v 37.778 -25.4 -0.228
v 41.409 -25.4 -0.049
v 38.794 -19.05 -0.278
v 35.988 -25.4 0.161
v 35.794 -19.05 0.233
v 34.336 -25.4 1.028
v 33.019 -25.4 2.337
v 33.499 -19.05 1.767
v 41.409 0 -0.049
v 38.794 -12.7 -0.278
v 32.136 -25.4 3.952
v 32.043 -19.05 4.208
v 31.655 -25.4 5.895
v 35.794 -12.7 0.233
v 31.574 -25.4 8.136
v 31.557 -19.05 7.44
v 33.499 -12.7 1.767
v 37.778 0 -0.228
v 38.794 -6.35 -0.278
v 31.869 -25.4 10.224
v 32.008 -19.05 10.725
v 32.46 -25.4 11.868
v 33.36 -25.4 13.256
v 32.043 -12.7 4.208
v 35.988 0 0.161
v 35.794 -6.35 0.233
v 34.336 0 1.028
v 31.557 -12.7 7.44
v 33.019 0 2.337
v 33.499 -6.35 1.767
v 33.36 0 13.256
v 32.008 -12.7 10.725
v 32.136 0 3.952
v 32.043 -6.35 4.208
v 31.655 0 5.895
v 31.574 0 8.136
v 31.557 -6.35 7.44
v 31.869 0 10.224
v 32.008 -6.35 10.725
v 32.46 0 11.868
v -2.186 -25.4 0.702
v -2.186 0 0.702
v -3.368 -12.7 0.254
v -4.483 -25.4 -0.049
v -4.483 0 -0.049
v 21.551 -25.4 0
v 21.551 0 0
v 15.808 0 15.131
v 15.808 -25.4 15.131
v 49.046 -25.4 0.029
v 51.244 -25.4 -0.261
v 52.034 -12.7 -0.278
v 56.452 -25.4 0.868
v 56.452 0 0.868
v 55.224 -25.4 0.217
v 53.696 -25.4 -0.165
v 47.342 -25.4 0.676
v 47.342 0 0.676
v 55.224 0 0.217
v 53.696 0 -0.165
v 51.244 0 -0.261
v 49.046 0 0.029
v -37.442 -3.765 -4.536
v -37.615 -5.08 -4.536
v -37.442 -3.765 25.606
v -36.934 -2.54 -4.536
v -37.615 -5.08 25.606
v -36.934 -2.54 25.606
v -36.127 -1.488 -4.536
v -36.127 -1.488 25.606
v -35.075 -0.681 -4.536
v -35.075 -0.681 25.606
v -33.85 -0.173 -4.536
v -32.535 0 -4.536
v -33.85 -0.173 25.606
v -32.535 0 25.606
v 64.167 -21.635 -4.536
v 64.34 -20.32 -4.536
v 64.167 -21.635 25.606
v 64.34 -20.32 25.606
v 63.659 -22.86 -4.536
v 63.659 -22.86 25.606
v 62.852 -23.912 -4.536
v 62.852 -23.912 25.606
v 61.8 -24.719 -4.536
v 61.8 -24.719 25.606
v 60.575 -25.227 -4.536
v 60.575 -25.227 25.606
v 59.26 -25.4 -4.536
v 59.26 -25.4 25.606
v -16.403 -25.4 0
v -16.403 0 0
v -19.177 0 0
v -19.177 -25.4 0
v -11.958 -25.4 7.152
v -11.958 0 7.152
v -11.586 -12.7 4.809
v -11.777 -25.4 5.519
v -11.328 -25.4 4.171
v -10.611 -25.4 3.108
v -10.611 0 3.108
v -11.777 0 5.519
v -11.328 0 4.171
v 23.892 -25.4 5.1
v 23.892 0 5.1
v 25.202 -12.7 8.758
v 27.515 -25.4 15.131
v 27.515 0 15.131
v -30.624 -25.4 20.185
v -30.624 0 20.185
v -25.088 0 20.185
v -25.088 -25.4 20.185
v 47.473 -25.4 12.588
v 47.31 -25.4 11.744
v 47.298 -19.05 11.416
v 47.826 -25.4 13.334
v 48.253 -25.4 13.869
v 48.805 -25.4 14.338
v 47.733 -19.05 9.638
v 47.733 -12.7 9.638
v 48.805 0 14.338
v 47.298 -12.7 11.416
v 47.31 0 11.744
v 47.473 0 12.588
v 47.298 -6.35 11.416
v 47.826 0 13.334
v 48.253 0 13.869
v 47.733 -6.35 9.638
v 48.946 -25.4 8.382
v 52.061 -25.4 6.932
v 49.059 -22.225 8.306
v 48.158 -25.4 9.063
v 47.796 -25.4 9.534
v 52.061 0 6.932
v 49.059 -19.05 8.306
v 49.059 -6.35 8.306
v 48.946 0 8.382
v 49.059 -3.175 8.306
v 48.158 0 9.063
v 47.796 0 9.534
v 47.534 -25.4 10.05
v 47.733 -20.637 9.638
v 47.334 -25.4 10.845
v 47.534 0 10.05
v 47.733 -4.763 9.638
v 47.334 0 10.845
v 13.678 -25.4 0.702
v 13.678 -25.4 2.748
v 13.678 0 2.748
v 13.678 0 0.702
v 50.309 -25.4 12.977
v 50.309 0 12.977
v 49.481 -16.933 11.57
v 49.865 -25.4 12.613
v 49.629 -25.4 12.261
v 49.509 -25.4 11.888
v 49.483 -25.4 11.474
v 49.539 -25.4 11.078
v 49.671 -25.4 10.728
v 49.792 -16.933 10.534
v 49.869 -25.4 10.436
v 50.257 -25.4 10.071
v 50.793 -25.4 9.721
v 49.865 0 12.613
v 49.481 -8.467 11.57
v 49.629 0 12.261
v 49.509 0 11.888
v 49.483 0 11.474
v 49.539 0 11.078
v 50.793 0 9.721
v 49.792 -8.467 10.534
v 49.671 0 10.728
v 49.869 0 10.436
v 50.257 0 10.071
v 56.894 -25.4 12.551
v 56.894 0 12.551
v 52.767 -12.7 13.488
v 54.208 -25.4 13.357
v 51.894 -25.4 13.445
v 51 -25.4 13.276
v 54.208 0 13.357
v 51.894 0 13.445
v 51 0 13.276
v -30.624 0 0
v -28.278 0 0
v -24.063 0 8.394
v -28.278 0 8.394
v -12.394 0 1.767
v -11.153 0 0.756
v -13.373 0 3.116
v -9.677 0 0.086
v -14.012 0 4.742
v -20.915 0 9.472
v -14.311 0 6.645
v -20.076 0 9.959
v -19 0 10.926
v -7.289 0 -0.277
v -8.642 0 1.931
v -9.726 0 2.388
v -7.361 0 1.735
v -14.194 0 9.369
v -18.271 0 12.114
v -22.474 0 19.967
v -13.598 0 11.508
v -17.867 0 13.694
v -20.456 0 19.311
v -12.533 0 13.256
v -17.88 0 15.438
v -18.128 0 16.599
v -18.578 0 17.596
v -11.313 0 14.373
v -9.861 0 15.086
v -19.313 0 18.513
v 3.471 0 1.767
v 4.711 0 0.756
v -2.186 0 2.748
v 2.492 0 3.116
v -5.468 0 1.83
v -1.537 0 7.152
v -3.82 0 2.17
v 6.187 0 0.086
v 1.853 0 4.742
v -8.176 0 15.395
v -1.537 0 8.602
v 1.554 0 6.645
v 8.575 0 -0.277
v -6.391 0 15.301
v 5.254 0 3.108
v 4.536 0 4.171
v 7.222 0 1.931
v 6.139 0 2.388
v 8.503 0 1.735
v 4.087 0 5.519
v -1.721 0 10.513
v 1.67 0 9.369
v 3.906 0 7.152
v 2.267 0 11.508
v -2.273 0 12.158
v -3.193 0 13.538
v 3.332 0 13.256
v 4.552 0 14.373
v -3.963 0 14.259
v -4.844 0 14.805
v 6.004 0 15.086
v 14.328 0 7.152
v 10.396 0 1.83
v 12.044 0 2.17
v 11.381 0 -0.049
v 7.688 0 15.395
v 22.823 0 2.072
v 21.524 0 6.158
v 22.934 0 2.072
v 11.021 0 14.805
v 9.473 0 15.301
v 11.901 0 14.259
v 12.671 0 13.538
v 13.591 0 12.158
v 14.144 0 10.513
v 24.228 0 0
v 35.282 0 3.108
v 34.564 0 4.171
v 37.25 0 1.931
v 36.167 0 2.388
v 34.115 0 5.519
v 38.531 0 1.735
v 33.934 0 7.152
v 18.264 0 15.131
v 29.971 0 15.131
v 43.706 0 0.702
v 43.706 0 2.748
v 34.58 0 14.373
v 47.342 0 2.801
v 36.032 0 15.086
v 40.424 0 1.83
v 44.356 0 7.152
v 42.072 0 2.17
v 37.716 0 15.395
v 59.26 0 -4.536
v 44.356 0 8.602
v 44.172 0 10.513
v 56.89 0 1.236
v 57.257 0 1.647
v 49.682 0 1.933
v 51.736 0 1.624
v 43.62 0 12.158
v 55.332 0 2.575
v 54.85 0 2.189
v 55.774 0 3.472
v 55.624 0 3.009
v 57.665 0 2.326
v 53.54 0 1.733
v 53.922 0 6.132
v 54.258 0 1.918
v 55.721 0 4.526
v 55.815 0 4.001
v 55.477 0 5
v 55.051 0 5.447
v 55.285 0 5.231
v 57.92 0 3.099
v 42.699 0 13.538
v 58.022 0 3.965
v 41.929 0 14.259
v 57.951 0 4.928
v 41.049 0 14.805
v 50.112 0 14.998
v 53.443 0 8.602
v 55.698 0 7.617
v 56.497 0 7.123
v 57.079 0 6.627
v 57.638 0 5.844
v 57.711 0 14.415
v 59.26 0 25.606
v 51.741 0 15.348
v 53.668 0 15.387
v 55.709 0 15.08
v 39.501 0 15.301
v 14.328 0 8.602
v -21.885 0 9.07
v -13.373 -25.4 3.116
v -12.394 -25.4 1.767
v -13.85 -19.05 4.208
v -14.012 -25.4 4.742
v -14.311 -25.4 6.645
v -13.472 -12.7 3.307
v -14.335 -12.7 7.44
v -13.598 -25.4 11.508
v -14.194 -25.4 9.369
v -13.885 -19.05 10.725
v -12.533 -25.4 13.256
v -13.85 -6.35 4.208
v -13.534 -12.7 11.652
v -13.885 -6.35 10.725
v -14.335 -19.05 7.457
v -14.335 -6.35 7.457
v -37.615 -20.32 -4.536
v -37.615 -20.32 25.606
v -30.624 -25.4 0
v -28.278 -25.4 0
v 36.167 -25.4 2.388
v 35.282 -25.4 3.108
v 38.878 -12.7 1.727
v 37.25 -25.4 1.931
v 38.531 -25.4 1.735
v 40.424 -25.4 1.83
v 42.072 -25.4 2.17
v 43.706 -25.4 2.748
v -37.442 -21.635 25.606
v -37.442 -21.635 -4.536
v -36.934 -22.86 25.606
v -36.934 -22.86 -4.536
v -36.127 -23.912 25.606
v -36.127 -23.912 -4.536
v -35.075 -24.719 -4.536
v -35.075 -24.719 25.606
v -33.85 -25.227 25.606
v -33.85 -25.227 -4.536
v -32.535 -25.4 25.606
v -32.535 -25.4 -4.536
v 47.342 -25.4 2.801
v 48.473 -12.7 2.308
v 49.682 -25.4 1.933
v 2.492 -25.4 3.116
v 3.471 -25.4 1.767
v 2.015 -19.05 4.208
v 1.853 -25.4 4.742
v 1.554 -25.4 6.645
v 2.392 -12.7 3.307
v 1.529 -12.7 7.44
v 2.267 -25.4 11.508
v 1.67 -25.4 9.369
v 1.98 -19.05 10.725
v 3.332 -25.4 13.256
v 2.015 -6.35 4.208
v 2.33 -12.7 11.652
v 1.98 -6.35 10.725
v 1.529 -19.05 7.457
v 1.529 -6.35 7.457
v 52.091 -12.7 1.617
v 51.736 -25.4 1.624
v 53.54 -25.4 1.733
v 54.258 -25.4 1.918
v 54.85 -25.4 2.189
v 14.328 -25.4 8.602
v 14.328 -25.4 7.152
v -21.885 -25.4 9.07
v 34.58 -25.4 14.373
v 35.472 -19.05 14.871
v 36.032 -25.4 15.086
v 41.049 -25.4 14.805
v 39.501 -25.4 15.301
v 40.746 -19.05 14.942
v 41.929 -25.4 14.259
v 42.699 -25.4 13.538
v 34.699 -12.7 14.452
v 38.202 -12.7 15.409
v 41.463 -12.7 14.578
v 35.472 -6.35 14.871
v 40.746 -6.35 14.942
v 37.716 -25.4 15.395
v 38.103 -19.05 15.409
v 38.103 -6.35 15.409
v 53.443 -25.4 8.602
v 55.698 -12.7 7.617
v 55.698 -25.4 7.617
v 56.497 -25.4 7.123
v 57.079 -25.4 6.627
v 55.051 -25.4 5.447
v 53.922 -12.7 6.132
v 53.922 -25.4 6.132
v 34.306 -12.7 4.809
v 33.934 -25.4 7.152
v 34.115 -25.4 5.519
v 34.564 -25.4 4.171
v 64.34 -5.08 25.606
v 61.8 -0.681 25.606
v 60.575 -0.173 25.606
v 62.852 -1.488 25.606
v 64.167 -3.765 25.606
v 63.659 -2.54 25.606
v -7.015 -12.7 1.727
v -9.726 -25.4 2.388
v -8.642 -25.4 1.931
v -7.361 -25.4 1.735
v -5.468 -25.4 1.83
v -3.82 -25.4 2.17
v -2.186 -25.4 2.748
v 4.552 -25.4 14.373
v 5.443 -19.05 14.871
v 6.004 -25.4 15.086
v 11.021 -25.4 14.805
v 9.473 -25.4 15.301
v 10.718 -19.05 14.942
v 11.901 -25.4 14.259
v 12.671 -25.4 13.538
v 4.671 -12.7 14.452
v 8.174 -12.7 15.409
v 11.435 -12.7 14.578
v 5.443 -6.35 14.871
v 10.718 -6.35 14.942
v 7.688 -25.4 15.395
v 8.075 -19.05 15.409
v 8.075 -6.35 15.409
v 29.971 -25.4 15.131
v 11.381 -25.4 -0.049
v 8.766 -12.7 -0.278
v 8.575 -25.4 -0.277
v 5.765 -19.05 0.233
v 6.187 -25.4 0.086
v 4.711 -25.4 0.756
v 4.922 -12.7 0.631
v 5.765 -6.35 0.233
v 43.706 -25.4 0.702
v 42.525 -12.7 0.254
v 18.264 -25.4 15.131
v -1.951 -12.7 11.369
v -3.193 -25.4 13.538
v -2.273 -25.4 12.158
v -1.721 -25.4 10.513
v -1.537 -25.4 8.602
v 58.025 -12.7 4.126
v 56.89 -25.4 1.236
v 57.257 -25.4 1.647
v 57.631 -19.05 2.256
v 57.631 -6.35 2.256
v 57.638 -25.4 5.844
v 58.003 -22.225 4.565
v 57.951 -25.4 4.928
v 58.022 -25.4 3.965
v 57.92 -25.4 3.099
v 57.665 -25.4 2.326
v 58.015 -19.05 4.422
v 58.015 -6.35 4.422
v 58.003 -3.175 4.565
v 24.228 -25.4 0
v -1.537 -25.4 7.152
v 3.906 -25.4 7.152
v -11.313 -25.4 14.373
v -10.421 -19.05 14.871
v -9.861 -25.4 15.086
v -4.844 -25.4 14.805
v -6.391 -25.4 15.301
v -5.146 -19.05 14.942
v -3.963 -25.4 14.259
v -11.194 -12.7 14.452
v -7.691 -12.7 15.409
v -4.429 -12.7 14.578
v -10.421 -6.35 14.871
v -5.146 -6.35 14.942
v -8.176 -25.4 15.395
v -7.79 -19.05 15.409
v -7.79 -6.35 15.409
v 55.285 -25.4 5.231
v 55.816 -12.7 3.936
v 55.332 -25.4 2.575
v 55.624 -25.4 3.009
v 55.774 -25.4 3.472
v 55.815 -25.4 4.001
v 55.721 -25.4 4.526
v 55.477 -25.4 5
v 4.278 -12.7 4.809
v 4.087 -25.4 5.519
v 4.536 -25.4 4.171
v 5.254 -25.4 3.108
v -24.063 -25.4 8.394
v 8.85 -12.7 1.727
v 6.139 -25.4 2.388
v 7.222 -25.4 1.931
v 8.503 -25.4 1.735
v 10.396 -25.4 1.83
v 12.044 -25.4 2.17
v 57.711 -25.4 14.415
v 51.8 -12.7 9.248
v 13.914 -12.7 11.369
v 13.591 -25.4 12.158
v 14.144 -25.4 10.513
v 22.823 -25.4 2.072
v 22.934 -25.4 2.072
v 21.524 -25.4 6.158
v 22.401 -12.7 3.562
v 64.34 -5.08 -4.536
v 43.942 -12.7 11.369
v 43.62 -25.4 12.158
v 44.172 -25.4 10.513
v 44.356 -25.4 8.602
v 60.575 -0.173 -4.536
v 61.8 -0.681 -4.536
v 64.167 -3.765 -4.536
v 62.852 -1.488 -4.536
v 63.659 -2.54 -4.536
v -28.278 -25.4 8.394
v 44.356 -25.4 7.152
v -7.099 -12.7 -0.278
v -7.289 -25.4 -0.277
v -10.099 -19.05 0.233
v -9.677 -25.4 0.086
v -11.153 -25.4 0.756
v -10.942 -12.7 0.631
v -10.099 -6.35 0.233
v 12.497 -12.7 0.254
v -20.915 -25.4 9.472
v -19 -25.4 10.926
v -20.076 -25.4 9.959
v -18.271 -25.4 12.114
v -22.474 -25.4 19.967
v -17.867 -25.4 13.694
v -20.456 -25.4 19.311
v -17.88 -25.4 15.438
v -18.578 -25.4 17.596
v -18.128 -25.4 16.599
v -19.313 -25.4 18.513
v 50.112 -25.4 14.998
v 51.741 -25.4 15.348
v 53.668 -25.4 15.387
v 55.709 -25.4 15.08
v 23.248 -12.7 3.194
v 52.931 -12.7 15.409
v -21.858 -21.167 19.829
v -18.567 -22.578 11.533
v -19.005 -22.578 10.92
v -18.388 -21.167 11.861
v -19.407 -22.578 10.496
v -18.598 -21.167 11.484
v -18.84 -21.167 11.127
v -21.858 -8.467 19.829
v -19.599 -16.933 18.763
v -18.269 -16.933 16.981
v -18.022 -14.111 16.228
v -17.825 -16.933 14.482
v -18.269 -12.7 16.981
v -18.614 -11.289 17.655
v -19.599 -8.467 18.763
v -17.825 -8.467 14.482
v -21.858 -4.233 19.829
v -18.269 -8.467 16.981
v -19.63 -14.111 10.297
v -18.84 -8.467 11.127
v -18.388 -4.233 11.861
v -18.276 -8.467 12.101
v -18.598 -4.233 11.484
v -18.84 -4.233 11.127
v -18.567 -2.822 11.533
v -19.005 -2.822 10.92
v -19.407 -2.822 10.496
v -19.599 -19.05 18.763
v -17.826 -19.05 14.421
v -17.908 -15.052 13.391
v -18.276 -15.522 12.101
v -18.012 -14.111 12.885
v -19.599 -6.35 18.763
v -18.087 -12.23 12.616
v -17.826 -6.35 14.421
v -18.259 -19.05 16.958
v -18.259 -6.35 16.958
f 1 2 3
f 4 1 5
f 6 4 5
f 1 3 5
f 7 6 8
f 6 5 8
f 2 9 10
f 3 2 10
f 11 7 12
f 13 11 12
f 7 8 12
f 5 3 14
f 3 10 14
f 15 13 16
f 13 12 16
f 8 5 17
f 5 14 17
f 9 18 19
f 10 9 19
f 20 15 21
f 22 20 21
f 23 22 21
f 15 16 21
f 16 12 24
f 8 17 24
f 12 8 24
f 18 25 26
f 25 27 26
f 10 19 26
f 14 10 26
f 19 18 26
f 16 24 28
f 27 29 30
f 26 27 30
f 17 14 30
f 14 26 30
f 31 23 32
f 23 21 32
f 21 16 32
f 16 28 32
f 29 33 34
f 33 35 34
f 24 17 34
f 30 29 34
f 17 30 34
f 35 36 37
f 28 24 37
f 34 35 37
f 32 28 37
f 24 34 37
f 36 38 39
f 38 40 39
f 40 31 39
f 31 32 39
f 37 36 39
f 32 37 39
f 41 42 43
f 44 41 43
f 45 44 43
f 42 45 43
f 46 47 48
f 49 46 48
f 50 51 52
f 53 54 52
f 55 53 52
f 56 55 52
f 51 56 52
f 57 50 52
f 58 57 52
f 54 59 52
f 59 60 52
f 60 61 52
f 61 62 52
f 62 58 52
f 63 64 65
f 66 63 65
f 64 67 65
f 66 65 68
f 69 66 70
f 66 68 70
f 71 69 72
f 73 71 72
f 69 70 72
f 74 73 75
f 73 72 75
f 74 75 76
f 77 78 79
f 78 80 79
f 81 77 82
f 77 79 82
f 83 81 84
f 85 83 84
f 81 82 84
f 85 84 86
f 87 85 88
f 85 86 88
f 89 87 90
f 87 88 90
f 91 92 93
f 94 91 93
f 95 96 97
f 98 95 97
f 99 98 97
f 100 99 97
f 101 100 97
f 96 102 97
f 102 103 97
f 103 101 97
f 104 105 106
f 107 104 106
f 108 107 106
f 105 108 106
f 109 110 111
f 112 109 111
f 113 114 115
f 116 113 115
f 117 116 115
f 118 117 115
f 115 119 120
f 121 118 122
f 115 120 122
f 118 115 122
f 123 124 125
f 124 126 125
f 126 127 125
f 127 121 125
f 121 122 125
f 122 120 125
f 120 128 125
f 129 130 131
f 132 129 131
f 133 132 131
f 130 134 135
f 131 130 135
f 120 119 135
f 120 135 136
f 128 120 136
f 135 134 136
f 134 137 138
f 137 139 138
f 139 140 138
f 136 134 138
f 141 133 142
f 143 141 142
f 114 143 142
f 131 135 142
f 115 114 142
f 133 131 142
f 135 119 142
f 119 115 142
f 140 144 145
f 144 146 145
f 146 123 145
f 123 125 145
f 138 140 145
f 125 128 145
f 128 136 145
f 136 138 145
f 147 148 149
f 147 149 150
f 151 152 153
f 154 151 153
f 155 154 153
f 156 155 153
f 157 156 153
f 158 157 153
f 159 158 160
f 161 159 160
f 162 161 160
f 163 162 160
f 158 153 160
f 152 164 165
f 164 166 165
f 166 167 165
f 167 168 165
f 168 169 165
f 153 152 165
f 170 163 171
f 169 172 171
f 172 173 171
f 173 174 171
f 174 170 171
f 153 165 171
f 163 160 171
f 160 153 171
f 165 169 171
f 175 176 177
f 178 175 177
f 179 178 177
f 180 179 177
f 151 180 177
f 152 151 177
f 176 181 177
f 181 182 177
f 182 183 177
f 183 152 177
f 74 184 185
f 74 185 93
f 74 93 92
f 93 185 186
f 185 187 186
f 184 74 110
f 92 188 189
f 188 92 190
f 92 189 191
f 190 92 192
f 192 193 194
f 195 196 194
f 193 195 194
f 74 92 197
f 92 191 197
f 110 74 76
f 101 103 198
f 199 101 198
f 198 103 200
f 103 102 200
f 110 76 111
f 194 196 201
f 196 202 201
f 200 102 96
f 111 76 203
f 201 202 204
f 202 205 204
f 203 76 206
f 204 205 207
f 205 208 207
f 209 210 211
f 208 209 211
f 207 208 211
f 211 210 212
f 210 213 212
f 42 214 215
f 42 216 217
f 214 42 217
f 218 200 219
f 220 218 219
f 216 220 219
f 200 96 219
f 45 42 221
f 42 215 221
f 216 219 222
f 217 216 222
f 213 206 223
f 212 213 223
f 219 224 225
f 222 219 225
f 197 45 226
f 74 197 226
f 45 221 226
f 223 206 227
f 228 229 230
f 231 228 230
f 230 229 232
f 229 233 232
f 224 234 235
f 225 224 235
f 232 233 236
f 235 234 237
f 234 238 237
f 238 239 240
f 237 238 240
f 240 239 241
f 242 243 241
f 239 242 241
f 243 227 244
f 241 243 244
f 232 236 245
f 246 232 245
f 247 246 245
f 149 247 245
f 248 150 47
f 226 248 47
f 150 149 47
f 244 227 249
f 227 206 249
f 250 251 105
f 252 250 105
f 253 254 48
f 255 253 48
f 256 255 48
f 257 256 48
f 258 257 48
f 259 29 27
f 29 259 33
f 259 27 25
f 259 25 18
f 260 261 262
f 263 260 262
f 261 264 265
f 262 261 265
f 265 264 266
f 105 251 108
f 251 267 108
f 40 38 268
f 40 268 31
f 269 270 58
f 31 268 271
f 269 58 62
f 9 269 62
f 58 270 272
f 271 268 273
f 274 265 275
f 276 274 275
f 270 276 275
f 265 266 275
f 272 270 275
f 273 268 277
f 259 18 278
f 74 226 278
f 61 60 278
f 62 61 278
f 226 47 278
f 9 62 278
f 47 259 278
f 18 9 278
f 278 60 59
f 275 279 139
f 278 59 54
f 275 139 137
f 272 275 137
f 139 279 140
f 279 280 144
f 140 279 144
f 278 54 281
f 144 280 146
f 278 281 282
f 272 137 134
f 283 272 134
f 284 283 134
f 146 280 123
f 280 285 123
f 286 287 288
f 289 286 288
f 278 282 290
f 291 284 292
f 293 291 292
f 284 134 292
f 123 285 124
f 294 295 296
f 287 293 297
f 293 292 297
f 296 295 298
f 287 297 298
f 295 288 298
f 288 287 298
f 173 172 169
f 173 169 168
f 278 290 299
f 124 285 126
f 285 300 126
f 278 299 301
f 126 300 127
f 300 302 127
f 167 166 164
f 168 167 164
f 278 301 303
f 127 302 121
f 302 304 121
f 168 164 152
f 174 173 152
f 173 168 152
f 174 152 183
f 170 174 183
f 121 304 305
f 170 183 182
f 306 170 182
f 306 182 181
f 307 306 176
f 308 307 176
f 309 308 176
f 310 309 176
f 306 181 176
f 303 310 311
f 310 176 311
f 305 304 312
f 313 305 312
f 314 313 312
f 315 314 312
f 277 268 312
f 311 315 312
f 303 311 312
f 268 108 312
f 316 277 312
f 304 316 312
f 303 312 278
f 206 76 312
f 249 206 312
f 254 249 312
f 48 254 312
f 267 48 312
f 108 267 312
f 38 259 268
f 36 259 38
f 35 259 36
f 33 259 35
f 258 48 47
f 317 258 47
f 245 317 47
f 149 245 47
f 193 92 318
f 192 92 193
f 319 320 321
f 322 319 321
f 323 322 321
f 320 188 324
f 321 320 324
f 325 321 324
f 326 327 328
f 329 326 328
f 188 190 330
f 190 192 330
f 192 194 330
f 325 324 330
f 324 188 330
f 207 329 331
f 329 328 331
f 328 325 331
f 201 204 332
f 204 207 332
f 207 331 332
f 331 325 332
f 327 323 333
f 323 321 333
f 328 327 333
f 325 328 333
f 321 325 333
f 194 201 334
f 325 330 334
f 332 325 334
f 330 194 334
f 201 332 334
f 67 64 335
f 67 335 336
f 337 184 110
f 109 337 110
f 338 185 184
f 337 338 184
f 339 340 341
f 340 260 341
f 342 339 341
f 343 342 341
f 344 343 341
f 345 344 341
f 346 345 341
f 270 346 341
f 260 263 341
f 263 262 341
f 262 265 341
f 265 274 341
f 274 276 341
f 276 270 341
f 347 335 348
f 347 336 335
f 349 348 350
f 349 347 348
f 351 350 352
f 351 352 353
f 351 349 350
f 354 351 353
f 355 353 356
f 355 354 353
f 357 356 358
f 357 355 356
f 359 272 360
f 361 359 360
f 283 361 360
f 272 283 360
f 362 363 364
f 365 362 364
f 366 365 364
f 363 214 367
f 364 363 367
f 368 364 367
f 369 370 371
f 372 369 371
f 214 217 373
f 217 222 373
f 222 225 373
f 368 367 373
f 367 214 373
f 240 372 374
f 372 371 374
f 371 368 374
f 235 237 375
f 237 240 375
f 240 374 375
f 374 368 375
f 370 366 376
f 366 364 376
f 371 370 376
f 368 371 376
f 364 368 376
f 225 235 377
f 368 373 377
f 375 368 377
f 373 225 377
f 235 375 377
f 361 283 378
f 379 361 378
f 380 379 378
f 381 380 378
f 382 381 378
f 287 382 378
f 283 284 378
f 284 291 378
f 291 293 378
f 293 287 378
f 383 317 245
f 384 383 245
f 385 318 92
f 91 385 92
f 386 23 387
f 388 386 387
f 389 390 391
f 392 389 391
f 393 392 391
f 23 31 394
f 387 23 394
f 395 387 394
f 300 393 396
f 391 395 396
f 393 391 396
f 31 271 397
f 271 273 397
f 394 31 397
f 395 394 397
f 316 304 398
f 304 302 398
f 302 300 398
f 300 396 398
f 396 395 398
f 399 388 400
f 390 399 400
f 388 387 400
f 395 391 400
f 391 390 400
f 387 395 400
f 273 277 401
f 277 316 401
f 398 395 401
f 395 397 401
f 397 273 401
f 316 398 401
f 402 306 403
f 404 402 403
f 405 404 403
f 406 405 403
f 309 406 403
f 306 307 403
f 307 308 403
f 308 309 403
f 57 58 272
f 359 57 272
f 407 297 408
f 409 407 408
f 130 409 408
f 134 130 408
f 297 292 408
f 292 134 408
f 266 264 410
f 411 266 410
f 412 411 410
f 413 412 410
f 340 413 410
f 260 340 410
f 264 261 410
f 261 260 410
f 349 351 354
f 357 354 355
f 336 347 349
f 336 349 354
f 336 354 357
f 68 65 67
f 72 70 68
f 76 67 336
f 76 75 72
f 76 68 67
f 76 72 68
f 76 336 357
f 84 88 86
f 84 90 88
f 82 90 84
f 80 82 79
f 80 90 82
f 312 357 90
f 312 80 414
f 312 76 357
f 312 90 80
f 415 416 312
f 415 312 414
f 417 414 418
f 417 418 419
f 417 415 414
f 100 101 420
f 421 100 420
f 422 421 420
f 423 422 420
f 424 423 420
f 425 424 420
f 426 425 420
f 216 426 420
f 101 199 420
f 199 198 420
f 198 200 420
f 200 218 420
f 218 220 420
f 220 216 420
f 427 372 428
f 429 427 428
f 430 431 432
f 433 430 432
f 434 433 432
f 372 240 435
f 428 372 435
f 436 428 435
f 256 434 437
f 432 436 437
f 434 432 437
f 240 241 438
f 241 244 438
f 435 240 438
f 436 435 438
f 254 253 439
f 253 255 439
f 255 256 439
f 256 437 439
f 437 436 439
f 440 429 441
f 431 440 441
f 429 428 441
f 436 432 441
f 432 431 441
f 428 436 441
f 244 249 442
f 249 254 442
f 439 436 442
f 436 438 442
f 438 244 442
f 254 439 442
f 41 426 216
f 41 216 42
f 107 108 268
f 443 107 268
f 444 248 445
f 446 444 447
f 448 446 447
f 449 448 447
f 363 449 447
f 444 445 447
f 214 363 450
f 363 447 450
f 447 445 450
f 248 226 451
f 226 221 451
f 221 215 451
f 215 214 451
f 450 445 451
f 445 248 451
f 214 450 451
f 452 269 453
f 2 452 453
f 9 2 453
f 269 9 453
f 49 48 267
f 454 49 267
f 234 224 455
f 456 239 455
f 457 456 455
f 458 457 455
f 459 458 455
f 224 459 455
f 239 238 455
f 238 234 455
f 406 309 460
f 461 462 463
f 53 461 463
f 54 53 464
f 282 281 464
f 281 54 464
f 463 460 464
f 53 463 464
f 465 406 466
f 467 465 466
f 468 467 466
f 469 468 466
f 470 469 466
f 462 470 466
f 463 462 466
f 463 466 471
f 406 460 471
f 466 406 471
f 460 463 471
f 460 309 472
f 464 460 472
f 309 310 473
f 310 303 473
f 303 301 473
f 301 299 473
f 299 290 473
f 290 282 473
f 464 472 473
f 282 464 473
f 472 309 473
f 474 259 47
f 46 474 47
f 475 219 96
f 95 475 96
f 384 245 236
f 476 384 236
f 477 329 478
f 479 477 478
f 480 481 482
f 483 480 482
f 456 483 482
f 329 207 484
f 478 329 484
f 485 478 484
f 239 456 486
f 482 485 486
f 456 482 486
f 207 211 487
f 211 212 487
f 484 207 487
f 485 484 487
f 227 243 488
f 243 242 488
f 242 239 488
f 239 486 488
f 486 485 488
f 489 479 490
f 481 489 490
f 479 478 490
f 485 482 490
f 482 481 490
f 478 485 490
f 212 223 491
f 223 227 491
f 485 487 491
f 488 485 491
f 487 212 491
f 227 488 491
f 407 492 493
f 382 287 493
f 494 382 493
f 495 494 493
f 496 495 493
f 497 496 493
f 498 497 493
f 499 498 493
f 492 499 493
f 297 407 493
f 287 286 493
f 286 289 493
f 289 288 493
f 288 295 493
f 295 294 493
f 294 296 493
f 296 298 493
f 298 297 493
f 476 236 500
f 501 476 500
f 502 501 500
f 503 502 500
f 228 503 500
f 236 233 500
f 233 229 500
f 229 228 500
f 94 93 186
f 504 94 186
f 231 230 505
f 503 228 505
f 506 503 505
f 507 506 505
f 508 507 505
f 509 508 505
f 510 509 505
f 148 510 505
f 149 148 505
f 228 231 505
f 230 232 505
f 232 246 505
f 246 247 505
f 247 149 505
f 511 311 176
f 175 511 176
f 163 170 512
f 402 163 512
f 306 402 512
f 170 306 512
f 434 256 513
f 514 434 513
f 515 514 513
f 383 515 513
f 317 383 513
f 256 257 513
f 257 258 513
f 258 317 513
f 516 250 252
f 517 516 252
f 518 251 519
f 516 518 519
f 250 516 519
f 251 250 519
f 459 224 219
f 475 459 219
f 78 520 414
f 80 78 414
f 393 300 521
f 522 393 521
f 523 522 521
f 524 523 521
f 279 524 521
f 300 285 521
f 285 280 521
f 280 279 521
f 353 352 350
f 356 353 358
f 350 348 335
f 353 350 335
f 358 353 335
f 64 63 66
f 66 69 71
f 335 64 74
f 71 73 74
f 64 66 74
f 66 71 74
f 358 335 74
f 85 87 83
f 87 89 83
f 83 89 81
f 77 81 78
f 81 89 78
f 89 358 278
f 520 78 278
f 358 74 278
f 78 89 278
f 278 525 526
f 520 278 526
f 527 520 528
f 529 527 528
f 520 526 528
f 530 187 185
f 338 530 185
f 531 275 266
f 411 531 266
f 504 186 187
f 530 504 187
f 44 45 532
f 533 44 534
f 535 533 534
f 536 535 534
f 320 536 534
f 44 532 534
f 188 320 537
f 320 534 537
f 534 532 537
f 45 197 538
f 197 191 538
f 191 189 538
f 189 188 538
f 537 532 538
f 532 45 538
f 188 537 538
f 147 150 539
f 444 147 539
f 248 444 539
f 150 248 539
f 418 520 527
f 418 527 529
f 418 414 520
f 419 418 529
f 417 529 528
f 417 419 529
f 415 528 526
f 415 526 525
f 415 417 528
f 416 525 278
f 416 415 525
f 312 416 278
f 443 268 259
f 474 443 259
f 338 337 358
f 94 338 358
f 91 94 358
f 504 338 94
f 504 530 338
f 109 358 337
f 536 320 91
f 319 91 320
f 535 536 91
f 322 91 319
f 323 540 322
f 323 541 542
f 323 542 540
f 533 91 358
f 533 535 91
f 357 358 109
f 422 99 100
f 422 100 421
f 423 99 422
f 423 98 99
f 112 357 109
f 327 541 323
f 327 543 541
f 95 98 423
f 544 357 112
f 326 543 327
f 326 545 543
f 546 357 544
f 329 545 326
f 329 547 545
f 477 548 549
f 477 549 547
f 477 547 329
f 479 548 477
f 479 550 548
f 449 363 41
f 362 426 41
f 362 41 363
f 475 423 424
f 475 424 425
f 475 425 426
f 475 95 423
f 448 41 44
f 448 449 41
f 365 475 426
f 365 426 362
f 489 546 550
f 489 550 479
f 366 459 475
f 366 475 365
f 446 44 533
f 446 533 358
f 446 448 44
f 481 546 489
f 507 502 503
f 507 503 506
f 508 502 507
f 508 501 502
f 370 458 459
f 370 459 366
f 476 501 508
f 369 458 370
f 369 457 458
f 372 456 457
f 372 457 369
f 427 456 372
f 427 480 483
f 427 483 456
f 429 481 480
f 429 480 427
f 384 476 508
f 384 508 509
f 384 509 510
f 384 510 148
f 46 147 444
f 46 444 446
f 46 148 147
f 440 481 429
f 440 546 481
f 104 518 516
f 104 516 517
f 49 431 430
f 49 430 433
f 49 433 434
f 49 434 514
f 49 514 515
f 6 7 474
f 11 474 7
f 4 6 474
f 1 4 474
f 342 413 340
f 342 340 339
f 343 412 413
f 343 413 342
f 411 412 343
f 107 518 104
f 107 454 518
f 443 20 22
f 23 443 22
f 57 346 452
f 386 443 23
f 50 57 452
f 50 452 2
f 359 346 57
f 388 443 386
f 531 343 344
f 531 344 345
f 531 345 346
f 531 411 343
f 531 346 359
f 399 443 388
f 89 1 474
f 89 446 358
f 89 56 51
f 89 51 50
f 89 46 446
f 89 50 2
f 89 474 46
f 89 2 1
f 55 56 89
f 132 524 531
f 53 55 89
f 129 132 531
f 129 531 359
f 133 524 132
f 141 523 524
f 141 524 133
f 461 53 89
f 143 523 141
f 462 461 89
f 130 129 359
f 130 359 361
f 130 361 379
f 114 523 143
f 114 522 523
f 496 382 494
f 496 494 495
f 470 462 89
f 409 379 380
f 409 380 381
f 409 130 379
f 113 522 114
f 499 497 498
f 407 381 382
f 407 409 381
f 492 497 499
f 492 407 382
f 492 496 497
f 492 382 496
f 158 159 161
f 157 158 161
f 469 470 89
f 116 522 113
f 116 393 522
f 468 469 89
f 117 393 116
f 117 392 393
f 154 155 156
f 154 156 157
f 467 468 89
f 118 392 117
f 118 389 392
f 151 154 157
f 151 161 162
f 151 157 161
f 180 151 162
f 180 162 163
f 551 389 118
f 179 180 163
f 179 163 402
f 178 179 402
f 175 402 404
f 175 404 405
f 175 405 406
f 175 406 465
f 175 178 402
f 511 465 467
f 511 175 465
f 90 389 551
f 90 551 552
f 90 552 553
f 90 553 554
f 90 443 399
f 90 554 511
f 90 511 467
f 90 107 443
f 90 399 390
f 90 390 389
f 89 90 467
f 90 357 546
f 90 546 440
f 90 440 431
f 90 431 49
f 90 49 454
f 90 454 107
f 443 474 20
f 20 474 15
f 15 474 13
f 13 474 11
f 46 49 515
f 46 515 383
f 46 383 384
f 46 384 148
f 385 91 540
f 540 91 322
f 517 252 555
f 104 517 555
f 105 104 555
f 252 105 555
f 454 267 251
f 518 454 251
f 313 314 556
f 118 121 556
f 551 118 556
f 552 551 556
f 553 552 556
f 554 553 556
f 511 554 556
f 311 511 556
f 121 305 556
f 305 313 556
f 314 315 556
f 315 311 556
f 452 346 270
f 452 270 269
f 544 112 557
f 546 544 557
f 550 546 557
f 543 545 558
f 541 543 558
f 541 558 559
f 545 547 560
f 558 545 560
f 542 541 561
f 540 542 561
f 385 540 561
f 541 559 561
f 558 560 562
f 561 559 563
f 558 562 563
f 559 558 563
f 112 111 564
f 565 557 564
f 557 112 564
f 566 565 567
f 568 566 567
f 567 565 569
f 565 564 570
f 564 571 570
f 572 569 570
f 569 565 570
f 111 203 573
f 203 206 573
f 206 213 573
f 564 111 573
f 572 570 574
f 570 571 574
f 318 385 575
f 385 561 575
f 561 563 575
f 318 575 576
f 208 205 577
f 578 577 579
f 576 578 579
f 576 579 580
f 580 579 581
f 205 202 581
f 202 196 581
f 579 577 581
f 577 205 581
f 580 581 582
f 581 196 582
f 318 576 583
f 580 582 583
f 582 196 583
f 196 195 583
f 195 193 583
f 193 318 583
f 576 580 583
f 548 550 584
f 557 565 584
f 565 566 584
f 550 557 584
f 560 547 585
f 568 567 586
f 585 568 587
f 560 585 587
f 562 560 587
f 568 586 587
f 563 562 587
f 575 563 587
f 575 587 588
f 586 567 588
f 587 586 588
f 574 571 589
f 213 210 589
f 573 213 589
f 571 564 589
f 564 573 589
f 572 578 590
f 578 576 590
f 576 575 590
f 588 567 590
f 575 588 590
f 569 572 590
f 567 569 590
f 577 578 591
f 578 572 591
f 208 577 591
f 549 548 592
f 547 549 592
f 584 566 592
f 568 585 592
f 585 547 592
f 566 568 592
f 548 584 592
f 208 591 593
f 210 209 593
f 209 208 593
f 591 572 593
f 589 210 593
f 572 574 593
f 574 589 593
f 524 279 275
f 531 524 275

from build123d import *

# Parameters (mm, degrees)
F0_W     = 101.9544452429
F0_H     = 30.142548494
F1_DEPTH = 25.4
F2_R     = 5.08


with BuildPart() as f1:
    # F0 (on Front) → F1 (new body)
    with BuildSketch(Plane.XZ):
        with Locations((13.3624821901, 10.5349854566)):
            Rectangle(F0_W, F0_H)
        with BuildLine():
            Line((-24.0632793571, 8.3938994471), (-28.2779004479, 8.3938994471))
            Line((-28.2779004479, 8.3938994471), (-28.2779004479, 0))
            Line((-28.2779004479, 0), (-30.6237744513, 0))
            Line((-30.6237744513, 0), (-30.6237744513, 20.1851192493))
            Line((-30.6237744513, 20.1851192493), (-25.088218658, 20.1851192493))
            add(Edge.make_bspline(
                [(-25.088218658, 20.1851192493), (-21.3728136922, 20.1851192493), (-19.5990502038, 18.7625741851)],
                knots=[0, 0, 0, 1, 1, 1], degree=2))
            add(Edge.make_bspline(
                [(-19.5990502038, 18.7625741851), (-17.8252867154, 17.3400291209), (-17.8252867154, 14.4816854671)],
                knots=[0, 0, 0, 1, 1, 1], degree=2))
            add(Edge.make_bspline(
                [(-17.8252867154, 14.4816854671), (-17.8252867154, 10.4791207834), (-21.8852833427, 9.0698292447)],
                knots=[0, 0, 0, 1, 1, 1], degree=2))
            Line((-21.8852833427, 9.0698292447), (-16.4027416512, 0))
            Line((-16.4027416512, 0), (-19.1771463105, 0))
            Line((-19.1771463105, 0), (-24.0632793571, 8.3938994471))
        make_face(mode=Mode.SUBTRACT)
        with BuildLine():
            add(Edge.make_bspline(
                [(-4.4834044363, -0.04859626), (-5.5657756808, -0.2783240343), (-7.0987667904, -0.2783240343)],
                knots=[0, 0, 0, 1, 1, 1], degree=2))
            add(Edge.make_bspline(
                [(-7.0987667904, -0.2783240343), (-10.4519087274, -0.2783240343), (-12.3935502048, 1.7671367257)],
                knots=[0, 0, 0, 1, 1, 1], degree=2))
            add(Edge.make_bspline(
                [(-12.3935502048, 1.7671367257), (-14.3351916821, 3.8125974857), (-14.3351916821, 7.4396456152)],
                knots=[0, 0, 0, 1, 1, 1], degree=2))
            add(Edge.make_bspline(
                [(-14.3351916821, 7.4396456152), (-14.3351916821, 11.1020364792), (-12.5327122219, 13.2557343637)],
                knots=[0, 0, 0, 1, 1, 1], degree=2))
            add(Edge.make_bspline(
                [(-12.5327122219, 13.2557343637), (-10.7302327617, 15.4094322481), (-7.6907575935, 15.4094322481)],
                knots=[0, 0, 0, 1, 1, 1], degree=2))
            add(Edge.make_bspline(
                [(-7.6907575935, 15.4094322481), (-4.8500853069, 15.4094322481), (-3.1933946266, 13.5384762398)],
                knots=[0, 0, 0, 1, 1, 1], degree=2))
            add(Edge.make_bspline(
                [(-3.1933946266, 13.5384762398), (-1.5367039462, 11.6675202314), (-1.5367039462, 8.6015380123)],
                knots=[0, 0, 0, 1, 1, 1], degree=2))
            Line((-1.5367039462, 8.6015380123), (-1.5367039462, 7.1524858973))
            Line((-1.5367039462, 7.1524858973), (-11.9583927861, 7.1524858973))
            add(Edge.make_bspline(
                [(-11.9583927861, 7.1524858973), (-11.887707317, 4.4885272833), (-10.6109510327, 3.1079517163)],
                knots=[0, 0, 0, 1, 1, 1], degree=2))
            add(Edge.make_bspline(
                [(-10.6109510327, 3.1079517163), (-9.3341947484, 1.7273761494), (-7.0148277959, 1.7273761494)],
                knots=[0, 0, 0, 1, 1, 1], degree=2))
            add(Edge.make_bspline(
                [(-7.0148277959, 1.7273761494), (-4.5717612726, 1.7273761494), (-2.1861266929, 2.7478976085)],
                knots=[0, 0, 0, 1, 1, 1], degree=2))
            Line((-2.1861266929, 2.7478976085), (-2.1861266929, 0.7024368485))
            add(Edge.make_bspline(
                [(-2.1861266929, 0.7024368485), (-3.4010331919, 0.1811315144), (-4.4834044363, -0.04859626)],
                knots=[0, 0, 0, 1, 1, 1], degree=2))
        make_face(mode=Mode.SUBTRACT)
        with BuildLine():
            add(Edge.make_bspline(
                [(11.3810655186, -0.04859626), (10.2986942741, -0.2783240343), (8.7657031646, -0.2783240343)],
                knots=[0, 0, 0, 1, 1, 1], degree=2))
            add(Edge.make_bspline(
                [(8.7657031646, -0.2783240343), (5.4125612276, -0.2783240343), (3.4709197502, 1.7671367257)],
                knots=[0, 0, 0, 1, 1, 1], degree=2))
            add(Edge.make_bspline(
                [(3.4709197502, 1.7671367257), (1.5292782729, 3.8125974857), (1.5292782729, 7.4396456152)],
                knots=[0, 0, 0, 1, 1, 1], degree=2))
            add(Edge.make_bspline(
                [(1.5292782729, 7.4396456152), (1.5292782729, 11.1020364792), (3.3317577331, 13.2557343637)],
                knots=[0, 0, 0, 1, 1, 1], degree=2))
            add(Edge.make_bspline(
                [(3.3317577331, 13.2557343637), (5.1342371933, 15.4094322481), (8.1737123615, 15.4094322481)],
                knots=[0, 0, 0, 1, 1, 1], degree=2))
            add(Edge.make_bspline(
                [(8.1737123615, 15.4094322481), (11.0143846481, 15.4094322481), (12.6710753284, 13.5384762398)],
                knots=[0, 0, 0, 1, 1, 1], degree=2))
            add(Edge.make_bspline(
                [(12.6710753284, 13.5384762398), (14.3277660087, 11.6675202314), (14.3277660087, 8.6015380123)],
                knots=[0, 0, 0, 1, 1, 1], degree=2))
            Line((14.3277660087, 8.6015380123), (14.3277660087, 7.1524858973))
            Line((14.3277660087, 7.1524858973), (3.9060771689, 7.1524858973))
            add(Edge.make_bspline(
                [(3.9060771689, 7.1524858973), (3.9767626379, 4.4885272833), (5.2535189223, 3.1079517163)],
                knots=[0, 0, 0, 1, 1, 1], degree=2))
            add(Edge.make_bspline(
                [(5.2535189223, 3.1079517163), (6.5302752066, 1.7273761494), (8.8496421591, 1.7273761494)],
                knots=[0, 0, 0, 1, 1, 1], degree=2))
            add(Edge.make_bspline(
                [(8.8496421591, 1.7273761494), (11.2927086824, 1.7273761494), (13.678343262, 2.7478976085)],
                knots=[0, 0, 0, 1, 1, 1], degree=2))
            Line((13.678343262, 2.7478976085), (13.678343262, 0.7024368485))
            add(Edge.make_bspline(
                [(13.678343262, 0.7024368485), (12.4634367631, 0.1811315144), (11.3810655186, -0.04859626)],
                knots=[0, 0, 0, 1, 1, 1], degree=2))
        make_face(mode=Mode.SUBTRACT)
        with BuildLine():
            Line((24.2281495145, 0), (21.550937375, 0))
            Line((21.550937375, 0), (15.8077430165, 15.1311082138))
            Line((15.8077430165, 15.1311082138), (18.2640630652, 15.1311082138))
            Line((18.2640630652, 15.1311082138), (21.5244303242, 6.1584714891))
            add(Edge.make_bspline(
                [(21.5244303242, 6.1584714891), (22.6288907777, 3.0085502755), (22.8232758176, 2.0719678109)],
                knots=[0, 0, 0, 1, 1, 1], degree=2))
            Line((22.8232758176, 2.0719678109), (22.9337218629, 2.0719678109))
            add(Edge.make_bspline(
                [(22.9337218629, 2.0719678109), (23.0839284846, 2.8009117102), (23.8923935366, 5.1003983746)],
                knots=[0, 0, 0, 1, 1, 1], degree=2))
            add(Edge.make_bspline(
                [(23.8923935366, 5.1003983746), (24.7008585886, 7.3998850389), (27.5150238243, 15.1311082138)],
                knots=[0, 0, 0, 1, 1, 1], degree=2))
            Line((27.5150238243, 15.1311082138), (29.971343873, 15.1311082138))
            Line((29.971343873, 15.1311082138), (24.2281495145, 0))
        make_face(mode=Mode.SUBTRACT)
        with BuildLine():
            add(Edge.make_bspline(
                [(41.4091363301, -0.04859626), (40.3267650856, -0.2783240343), (38.7937739761, -0.2783240343)],
                knots=[0, 0, 0, 1, 1, 1], degree=2))
            add(Edge.make_bspline(
                [(38.7937739761, -0.2783240343), (35.4406320391, -0.2783240343), (33.4989905617, 1.7671367257)],
                knots=[0, 0, 0, 1, 1, 1], degree=2))
            add(Edge.make_bspline(
                [(33.4989905617, 1.7671367257), (31.5573490843, 3.8125974857), (31.5573490843, 7.4396456152)],
                knots=[0, 0, 0, 1, 1, 1], degree=2))
            add(Edge.make_bspline(
                [(31.5573490843, 7.4396456152), (31.5573490843, 11.1020364792), (33.3598285445, 13.2557343637)],
                knots=[0, 0, 0, 1, 1, 1], degree=2))
            add(Edge.make_bspline(
                [(33.3598285445, 13.2557343637), (35.1623080048, 15.4094322481), (38.201783173, 15.4094322481)],
                knots=[0, 0, 0, 1, 1, 1], degree=2))
            add(Edge.make_bspline(
                [(38.201783173, 15.4094322481), (41.0424554595, 15.4094322481), (42.6991461399, 13.5384762398)],
                knots=[0, 0, 0, 1, 1, 1], degree=2))
            add(Edge.make_bspline(
                [(42.6991461399, 13.5384762398), (44.3558368202, 11.6675202314), (44.3558368202, 8.6015380123)],
                knots=[0, 0, 0, 1, 1, 1], degree=2))
            Line((44.3558368202, 8.6015380123), (44.3558368202, 7.1524858973))
            Line((44.3558368202, 7.1524858973), (33.9341479804, 7.1524858973))
            add(Edge.make_bspline(
                [(33.9341479804, 7.1524858973), (34.0048334494, 4.4885272833), (35.2815897337, 3.1079517163)],
                knots=[0, 0, 0, 1, 1, 1], degree=2))
            add(Edge.make_bspline(
                [(35.2815897337, 3.1079517163), (36.5583460181, 1.7273761494), (38.8777129705, 1.7273761494)],
                knots=[0, 0, 0, 1, 1, 1], degree=2))
            add(Edge.make_bspline(
                [(38.8777129705, 1.7273761494), (41.3207794938, 1.7273761494), (43.7064140735, 2.7478976085)],
                knots=[0, 0, 0, 1, 1, 1], degree=2))
            Line((43.7064140735, 2.7478976085), (43.7064140735, 0.7024368485))
            add(Edge.make_bspline(
                [(43.7064140735, 0.7024368485), (42.4915075746, 0.1811315144), (41.4091363301, -0.04859626)],
                knots=[0, 0, 0, 1, 1, 1], degree=2))
        make_face(mode=Mode.SUBTRACT)
        with BuildLine():
            add(Edge.make_bspline(
                [(57.0792212453, 6.6267627214), (58.0246393935, 5.6327483132), (58.0246393935, 4.1262642545)],
                knots=[0, 0, 0, 1, 1, 1], degree=2))
            add(Edge.make_bspline(
                [(58.0246393935, 4.1262642545), (58.0246393935, 2.0145358673), (56.4518877076, 0.8681059165)],
                knots=[0, 0, 0, 1, 1, 1], degree=2))
            add(Edge.make_bspline(
                [(56.4518877076, 0.8681059165), (54.8791360218, -0.2783240343), (52.0340458934, -0.2783240343)],
                knots=[0, 0, 0, 1, 1, 1], degree=2))
            add(Edge.make_bspline(
                [(52.0340458934, -0.2783240343), (49.0254956179, -0.2783240343), (47.3422978867, 0.6759297976)],
                knots=[0, 0, 0, 1, 1, 1], degree=2))
            Line((47.3422978867, 0.6759297976), (47.3422978867, 2.8009117102))
            add(Edge.make_bspline(
                [(47.3422978867, 2.8009117102), (48.4335048148, 2.2486814835), (49.6815451273, 1.9328057937)],
                knots=[0, 0, 0, 1, 1, 1], degree=2))
            add(Edge.make_bspline(
                [(49.6815451273, 1.9328057937), (50.9295854398, 1.616930104), (52.091477837, 1.616930104)],
                knots=[0, 0, 0, 1, 1, 1], degree=2))
            add(Edge.make_bspline(
                [(52.091477837, 1.616930104), (53.8851216136, 1.616930104), (54.85042005, 2.189040619)],
                knots=[0, 0, 0, 1, 1, 1], degree=2))
            add(Edge.make_bspline(
                [(54.85042005, 2.189040619), (55.8157184864, 2.7611511339), (55.8157184864, 3.9362970565)],
                knots=[0, 0, 0, 1, 1, 1], degree=2))
            add(Edge.make_bspline(
                [(55.8157184864, 3.9362970565), (55.8157184864, 4.8198654193), (55.0514318525, 5.447198957)],
                knots=[0, 0, 0, 1, 1, 1], degree=2))
            add(Edge.make_bspline(
                [(55.0514318525, 5.447198957), (54.2871452187, 6.0745324946), (52.0605529443, 6.9315938066)],
                knots=[0, 0, 0, 1, 1, 1], degree=2))
            add(Edge.make_bspline(
                [(52.0605529443, 6.9315938066), (49.9488245571, 7.7179696495), (49.0586294315, 8.3055426108)],
                knots=[0, 0, 0, 1, 1, 1], degree=2))
            add(Edge.make_bspline(
                [(49.0586294315, 8.3055426108), (48.1684343059, 8.8931155721), (47.7332768872, 9.6375219178)],
                knots=[0, 0, 0, 1, 1, 1], degree=2))
            add(Edge.make_bspline(
                [(47.7332768872, 9.6375219178), (47.2981194685, 10.3819282635), (47.2981194685, 11.415703248)],
                knots=[0, 0, 0, 1, 1, 1], degree=2))
            add(Edge.make_bspline(
                [(47.2981194685, 11.415703248), (47.2981194685, 13.2667789682), (48.8046035272, 14.3381056082)],
                knots=[0, 0, 0, 1, 1, 1], degree=2))
            add(Edge.make_bspline(
                [(48.8046035272, 14.3381056082), (50.3110875858, 15.4094322481), (52.9308677817, 15.4094322481)],
                knots=[0, 0, 0, 1, 1, 1], degree=2))
            add(Edge.make_bspline(
                [(52.9308677817, 15.4094322481), (55.373934305, 15.4094322481), (57.7109726247, 14.4154178399)],
                knots=[0, 0, 0, 1, 1, 1], degree=2))
            Line((57.7109726247, 14.4154178399), (56.8936718891, 12.5510885943))
            add(Edge.make_bspline(
                [(56.8936718891, 12.5510885943), (54.6184833547, 13.4876710589), (52.7674076346, 13.4876710589)],
                knots=[0, 0, 0, 1, 1, 1], degree=2))
            add(Edge.make_bspline(
                [(52.7674076346, 13.4876710589), (51.1372240051, 13.4876710589), (50.3088786649, 12.9774103294)],
                knots=[0, 0, 0, 1, 1, 1], degree=2))
            add(Edge.make_bspline(
                [(50.3088786649, 12.9774103294), (49.4805333248, 12.4671495998), (49.4805333248, 11.5703277115)],
                knots=[0, 0, 0, 1, 1, 1], degree=2))
            add(Edge.make_bspline(
                [(49.4805333248, 11.5703277115), (49.4805333248, 10.9606655412), (49.7919911727, 10.5343438061)],
                knots=[0, 0, 0, 1, 1, 1], degree=2))
            add(Edge.make_bspline(
                [(49.7919911727, 10.5343438061), (50.1034490206, 10.108022071), (50.7926323436, 9.7214609123)],
                knots=[0, 0, 0, 1, 1, 1], degree=2))
            add(Edge.make_bspline(
                [(50.7926323436, 9.7214609123), (51.4818156666, 9.3348997535), (53.4433374321, 8.6015380123)],
                knots=[0, 0, 0, 1, 1, 1], degree=2))
            add(Edge.make_bspline(
                [(53.4433374321, 8.6015380123), (56.133803097, 7.6207771296), (57.0792212453, 6.6267627214)],
                knots=[0, 0, 0, 1, 1, 1], degree=2))
        make_face(mode=Mode.SUBTRACT)
    extrude(amount=F1_DEPTH)

    # F2
    f2_edges = [f1.edges().sort_by_distance(p)[0] for p in [
        (64.339705, -25.4, 10.534985),
        (-37.61474, -25.4, 10.534985),
        (64.339705, 0, 10.534985),
        (-37.61474, 0, 10.534985),
    ]]
    fillet(f2_edges, radius=F2_R)


solid = f1.part
